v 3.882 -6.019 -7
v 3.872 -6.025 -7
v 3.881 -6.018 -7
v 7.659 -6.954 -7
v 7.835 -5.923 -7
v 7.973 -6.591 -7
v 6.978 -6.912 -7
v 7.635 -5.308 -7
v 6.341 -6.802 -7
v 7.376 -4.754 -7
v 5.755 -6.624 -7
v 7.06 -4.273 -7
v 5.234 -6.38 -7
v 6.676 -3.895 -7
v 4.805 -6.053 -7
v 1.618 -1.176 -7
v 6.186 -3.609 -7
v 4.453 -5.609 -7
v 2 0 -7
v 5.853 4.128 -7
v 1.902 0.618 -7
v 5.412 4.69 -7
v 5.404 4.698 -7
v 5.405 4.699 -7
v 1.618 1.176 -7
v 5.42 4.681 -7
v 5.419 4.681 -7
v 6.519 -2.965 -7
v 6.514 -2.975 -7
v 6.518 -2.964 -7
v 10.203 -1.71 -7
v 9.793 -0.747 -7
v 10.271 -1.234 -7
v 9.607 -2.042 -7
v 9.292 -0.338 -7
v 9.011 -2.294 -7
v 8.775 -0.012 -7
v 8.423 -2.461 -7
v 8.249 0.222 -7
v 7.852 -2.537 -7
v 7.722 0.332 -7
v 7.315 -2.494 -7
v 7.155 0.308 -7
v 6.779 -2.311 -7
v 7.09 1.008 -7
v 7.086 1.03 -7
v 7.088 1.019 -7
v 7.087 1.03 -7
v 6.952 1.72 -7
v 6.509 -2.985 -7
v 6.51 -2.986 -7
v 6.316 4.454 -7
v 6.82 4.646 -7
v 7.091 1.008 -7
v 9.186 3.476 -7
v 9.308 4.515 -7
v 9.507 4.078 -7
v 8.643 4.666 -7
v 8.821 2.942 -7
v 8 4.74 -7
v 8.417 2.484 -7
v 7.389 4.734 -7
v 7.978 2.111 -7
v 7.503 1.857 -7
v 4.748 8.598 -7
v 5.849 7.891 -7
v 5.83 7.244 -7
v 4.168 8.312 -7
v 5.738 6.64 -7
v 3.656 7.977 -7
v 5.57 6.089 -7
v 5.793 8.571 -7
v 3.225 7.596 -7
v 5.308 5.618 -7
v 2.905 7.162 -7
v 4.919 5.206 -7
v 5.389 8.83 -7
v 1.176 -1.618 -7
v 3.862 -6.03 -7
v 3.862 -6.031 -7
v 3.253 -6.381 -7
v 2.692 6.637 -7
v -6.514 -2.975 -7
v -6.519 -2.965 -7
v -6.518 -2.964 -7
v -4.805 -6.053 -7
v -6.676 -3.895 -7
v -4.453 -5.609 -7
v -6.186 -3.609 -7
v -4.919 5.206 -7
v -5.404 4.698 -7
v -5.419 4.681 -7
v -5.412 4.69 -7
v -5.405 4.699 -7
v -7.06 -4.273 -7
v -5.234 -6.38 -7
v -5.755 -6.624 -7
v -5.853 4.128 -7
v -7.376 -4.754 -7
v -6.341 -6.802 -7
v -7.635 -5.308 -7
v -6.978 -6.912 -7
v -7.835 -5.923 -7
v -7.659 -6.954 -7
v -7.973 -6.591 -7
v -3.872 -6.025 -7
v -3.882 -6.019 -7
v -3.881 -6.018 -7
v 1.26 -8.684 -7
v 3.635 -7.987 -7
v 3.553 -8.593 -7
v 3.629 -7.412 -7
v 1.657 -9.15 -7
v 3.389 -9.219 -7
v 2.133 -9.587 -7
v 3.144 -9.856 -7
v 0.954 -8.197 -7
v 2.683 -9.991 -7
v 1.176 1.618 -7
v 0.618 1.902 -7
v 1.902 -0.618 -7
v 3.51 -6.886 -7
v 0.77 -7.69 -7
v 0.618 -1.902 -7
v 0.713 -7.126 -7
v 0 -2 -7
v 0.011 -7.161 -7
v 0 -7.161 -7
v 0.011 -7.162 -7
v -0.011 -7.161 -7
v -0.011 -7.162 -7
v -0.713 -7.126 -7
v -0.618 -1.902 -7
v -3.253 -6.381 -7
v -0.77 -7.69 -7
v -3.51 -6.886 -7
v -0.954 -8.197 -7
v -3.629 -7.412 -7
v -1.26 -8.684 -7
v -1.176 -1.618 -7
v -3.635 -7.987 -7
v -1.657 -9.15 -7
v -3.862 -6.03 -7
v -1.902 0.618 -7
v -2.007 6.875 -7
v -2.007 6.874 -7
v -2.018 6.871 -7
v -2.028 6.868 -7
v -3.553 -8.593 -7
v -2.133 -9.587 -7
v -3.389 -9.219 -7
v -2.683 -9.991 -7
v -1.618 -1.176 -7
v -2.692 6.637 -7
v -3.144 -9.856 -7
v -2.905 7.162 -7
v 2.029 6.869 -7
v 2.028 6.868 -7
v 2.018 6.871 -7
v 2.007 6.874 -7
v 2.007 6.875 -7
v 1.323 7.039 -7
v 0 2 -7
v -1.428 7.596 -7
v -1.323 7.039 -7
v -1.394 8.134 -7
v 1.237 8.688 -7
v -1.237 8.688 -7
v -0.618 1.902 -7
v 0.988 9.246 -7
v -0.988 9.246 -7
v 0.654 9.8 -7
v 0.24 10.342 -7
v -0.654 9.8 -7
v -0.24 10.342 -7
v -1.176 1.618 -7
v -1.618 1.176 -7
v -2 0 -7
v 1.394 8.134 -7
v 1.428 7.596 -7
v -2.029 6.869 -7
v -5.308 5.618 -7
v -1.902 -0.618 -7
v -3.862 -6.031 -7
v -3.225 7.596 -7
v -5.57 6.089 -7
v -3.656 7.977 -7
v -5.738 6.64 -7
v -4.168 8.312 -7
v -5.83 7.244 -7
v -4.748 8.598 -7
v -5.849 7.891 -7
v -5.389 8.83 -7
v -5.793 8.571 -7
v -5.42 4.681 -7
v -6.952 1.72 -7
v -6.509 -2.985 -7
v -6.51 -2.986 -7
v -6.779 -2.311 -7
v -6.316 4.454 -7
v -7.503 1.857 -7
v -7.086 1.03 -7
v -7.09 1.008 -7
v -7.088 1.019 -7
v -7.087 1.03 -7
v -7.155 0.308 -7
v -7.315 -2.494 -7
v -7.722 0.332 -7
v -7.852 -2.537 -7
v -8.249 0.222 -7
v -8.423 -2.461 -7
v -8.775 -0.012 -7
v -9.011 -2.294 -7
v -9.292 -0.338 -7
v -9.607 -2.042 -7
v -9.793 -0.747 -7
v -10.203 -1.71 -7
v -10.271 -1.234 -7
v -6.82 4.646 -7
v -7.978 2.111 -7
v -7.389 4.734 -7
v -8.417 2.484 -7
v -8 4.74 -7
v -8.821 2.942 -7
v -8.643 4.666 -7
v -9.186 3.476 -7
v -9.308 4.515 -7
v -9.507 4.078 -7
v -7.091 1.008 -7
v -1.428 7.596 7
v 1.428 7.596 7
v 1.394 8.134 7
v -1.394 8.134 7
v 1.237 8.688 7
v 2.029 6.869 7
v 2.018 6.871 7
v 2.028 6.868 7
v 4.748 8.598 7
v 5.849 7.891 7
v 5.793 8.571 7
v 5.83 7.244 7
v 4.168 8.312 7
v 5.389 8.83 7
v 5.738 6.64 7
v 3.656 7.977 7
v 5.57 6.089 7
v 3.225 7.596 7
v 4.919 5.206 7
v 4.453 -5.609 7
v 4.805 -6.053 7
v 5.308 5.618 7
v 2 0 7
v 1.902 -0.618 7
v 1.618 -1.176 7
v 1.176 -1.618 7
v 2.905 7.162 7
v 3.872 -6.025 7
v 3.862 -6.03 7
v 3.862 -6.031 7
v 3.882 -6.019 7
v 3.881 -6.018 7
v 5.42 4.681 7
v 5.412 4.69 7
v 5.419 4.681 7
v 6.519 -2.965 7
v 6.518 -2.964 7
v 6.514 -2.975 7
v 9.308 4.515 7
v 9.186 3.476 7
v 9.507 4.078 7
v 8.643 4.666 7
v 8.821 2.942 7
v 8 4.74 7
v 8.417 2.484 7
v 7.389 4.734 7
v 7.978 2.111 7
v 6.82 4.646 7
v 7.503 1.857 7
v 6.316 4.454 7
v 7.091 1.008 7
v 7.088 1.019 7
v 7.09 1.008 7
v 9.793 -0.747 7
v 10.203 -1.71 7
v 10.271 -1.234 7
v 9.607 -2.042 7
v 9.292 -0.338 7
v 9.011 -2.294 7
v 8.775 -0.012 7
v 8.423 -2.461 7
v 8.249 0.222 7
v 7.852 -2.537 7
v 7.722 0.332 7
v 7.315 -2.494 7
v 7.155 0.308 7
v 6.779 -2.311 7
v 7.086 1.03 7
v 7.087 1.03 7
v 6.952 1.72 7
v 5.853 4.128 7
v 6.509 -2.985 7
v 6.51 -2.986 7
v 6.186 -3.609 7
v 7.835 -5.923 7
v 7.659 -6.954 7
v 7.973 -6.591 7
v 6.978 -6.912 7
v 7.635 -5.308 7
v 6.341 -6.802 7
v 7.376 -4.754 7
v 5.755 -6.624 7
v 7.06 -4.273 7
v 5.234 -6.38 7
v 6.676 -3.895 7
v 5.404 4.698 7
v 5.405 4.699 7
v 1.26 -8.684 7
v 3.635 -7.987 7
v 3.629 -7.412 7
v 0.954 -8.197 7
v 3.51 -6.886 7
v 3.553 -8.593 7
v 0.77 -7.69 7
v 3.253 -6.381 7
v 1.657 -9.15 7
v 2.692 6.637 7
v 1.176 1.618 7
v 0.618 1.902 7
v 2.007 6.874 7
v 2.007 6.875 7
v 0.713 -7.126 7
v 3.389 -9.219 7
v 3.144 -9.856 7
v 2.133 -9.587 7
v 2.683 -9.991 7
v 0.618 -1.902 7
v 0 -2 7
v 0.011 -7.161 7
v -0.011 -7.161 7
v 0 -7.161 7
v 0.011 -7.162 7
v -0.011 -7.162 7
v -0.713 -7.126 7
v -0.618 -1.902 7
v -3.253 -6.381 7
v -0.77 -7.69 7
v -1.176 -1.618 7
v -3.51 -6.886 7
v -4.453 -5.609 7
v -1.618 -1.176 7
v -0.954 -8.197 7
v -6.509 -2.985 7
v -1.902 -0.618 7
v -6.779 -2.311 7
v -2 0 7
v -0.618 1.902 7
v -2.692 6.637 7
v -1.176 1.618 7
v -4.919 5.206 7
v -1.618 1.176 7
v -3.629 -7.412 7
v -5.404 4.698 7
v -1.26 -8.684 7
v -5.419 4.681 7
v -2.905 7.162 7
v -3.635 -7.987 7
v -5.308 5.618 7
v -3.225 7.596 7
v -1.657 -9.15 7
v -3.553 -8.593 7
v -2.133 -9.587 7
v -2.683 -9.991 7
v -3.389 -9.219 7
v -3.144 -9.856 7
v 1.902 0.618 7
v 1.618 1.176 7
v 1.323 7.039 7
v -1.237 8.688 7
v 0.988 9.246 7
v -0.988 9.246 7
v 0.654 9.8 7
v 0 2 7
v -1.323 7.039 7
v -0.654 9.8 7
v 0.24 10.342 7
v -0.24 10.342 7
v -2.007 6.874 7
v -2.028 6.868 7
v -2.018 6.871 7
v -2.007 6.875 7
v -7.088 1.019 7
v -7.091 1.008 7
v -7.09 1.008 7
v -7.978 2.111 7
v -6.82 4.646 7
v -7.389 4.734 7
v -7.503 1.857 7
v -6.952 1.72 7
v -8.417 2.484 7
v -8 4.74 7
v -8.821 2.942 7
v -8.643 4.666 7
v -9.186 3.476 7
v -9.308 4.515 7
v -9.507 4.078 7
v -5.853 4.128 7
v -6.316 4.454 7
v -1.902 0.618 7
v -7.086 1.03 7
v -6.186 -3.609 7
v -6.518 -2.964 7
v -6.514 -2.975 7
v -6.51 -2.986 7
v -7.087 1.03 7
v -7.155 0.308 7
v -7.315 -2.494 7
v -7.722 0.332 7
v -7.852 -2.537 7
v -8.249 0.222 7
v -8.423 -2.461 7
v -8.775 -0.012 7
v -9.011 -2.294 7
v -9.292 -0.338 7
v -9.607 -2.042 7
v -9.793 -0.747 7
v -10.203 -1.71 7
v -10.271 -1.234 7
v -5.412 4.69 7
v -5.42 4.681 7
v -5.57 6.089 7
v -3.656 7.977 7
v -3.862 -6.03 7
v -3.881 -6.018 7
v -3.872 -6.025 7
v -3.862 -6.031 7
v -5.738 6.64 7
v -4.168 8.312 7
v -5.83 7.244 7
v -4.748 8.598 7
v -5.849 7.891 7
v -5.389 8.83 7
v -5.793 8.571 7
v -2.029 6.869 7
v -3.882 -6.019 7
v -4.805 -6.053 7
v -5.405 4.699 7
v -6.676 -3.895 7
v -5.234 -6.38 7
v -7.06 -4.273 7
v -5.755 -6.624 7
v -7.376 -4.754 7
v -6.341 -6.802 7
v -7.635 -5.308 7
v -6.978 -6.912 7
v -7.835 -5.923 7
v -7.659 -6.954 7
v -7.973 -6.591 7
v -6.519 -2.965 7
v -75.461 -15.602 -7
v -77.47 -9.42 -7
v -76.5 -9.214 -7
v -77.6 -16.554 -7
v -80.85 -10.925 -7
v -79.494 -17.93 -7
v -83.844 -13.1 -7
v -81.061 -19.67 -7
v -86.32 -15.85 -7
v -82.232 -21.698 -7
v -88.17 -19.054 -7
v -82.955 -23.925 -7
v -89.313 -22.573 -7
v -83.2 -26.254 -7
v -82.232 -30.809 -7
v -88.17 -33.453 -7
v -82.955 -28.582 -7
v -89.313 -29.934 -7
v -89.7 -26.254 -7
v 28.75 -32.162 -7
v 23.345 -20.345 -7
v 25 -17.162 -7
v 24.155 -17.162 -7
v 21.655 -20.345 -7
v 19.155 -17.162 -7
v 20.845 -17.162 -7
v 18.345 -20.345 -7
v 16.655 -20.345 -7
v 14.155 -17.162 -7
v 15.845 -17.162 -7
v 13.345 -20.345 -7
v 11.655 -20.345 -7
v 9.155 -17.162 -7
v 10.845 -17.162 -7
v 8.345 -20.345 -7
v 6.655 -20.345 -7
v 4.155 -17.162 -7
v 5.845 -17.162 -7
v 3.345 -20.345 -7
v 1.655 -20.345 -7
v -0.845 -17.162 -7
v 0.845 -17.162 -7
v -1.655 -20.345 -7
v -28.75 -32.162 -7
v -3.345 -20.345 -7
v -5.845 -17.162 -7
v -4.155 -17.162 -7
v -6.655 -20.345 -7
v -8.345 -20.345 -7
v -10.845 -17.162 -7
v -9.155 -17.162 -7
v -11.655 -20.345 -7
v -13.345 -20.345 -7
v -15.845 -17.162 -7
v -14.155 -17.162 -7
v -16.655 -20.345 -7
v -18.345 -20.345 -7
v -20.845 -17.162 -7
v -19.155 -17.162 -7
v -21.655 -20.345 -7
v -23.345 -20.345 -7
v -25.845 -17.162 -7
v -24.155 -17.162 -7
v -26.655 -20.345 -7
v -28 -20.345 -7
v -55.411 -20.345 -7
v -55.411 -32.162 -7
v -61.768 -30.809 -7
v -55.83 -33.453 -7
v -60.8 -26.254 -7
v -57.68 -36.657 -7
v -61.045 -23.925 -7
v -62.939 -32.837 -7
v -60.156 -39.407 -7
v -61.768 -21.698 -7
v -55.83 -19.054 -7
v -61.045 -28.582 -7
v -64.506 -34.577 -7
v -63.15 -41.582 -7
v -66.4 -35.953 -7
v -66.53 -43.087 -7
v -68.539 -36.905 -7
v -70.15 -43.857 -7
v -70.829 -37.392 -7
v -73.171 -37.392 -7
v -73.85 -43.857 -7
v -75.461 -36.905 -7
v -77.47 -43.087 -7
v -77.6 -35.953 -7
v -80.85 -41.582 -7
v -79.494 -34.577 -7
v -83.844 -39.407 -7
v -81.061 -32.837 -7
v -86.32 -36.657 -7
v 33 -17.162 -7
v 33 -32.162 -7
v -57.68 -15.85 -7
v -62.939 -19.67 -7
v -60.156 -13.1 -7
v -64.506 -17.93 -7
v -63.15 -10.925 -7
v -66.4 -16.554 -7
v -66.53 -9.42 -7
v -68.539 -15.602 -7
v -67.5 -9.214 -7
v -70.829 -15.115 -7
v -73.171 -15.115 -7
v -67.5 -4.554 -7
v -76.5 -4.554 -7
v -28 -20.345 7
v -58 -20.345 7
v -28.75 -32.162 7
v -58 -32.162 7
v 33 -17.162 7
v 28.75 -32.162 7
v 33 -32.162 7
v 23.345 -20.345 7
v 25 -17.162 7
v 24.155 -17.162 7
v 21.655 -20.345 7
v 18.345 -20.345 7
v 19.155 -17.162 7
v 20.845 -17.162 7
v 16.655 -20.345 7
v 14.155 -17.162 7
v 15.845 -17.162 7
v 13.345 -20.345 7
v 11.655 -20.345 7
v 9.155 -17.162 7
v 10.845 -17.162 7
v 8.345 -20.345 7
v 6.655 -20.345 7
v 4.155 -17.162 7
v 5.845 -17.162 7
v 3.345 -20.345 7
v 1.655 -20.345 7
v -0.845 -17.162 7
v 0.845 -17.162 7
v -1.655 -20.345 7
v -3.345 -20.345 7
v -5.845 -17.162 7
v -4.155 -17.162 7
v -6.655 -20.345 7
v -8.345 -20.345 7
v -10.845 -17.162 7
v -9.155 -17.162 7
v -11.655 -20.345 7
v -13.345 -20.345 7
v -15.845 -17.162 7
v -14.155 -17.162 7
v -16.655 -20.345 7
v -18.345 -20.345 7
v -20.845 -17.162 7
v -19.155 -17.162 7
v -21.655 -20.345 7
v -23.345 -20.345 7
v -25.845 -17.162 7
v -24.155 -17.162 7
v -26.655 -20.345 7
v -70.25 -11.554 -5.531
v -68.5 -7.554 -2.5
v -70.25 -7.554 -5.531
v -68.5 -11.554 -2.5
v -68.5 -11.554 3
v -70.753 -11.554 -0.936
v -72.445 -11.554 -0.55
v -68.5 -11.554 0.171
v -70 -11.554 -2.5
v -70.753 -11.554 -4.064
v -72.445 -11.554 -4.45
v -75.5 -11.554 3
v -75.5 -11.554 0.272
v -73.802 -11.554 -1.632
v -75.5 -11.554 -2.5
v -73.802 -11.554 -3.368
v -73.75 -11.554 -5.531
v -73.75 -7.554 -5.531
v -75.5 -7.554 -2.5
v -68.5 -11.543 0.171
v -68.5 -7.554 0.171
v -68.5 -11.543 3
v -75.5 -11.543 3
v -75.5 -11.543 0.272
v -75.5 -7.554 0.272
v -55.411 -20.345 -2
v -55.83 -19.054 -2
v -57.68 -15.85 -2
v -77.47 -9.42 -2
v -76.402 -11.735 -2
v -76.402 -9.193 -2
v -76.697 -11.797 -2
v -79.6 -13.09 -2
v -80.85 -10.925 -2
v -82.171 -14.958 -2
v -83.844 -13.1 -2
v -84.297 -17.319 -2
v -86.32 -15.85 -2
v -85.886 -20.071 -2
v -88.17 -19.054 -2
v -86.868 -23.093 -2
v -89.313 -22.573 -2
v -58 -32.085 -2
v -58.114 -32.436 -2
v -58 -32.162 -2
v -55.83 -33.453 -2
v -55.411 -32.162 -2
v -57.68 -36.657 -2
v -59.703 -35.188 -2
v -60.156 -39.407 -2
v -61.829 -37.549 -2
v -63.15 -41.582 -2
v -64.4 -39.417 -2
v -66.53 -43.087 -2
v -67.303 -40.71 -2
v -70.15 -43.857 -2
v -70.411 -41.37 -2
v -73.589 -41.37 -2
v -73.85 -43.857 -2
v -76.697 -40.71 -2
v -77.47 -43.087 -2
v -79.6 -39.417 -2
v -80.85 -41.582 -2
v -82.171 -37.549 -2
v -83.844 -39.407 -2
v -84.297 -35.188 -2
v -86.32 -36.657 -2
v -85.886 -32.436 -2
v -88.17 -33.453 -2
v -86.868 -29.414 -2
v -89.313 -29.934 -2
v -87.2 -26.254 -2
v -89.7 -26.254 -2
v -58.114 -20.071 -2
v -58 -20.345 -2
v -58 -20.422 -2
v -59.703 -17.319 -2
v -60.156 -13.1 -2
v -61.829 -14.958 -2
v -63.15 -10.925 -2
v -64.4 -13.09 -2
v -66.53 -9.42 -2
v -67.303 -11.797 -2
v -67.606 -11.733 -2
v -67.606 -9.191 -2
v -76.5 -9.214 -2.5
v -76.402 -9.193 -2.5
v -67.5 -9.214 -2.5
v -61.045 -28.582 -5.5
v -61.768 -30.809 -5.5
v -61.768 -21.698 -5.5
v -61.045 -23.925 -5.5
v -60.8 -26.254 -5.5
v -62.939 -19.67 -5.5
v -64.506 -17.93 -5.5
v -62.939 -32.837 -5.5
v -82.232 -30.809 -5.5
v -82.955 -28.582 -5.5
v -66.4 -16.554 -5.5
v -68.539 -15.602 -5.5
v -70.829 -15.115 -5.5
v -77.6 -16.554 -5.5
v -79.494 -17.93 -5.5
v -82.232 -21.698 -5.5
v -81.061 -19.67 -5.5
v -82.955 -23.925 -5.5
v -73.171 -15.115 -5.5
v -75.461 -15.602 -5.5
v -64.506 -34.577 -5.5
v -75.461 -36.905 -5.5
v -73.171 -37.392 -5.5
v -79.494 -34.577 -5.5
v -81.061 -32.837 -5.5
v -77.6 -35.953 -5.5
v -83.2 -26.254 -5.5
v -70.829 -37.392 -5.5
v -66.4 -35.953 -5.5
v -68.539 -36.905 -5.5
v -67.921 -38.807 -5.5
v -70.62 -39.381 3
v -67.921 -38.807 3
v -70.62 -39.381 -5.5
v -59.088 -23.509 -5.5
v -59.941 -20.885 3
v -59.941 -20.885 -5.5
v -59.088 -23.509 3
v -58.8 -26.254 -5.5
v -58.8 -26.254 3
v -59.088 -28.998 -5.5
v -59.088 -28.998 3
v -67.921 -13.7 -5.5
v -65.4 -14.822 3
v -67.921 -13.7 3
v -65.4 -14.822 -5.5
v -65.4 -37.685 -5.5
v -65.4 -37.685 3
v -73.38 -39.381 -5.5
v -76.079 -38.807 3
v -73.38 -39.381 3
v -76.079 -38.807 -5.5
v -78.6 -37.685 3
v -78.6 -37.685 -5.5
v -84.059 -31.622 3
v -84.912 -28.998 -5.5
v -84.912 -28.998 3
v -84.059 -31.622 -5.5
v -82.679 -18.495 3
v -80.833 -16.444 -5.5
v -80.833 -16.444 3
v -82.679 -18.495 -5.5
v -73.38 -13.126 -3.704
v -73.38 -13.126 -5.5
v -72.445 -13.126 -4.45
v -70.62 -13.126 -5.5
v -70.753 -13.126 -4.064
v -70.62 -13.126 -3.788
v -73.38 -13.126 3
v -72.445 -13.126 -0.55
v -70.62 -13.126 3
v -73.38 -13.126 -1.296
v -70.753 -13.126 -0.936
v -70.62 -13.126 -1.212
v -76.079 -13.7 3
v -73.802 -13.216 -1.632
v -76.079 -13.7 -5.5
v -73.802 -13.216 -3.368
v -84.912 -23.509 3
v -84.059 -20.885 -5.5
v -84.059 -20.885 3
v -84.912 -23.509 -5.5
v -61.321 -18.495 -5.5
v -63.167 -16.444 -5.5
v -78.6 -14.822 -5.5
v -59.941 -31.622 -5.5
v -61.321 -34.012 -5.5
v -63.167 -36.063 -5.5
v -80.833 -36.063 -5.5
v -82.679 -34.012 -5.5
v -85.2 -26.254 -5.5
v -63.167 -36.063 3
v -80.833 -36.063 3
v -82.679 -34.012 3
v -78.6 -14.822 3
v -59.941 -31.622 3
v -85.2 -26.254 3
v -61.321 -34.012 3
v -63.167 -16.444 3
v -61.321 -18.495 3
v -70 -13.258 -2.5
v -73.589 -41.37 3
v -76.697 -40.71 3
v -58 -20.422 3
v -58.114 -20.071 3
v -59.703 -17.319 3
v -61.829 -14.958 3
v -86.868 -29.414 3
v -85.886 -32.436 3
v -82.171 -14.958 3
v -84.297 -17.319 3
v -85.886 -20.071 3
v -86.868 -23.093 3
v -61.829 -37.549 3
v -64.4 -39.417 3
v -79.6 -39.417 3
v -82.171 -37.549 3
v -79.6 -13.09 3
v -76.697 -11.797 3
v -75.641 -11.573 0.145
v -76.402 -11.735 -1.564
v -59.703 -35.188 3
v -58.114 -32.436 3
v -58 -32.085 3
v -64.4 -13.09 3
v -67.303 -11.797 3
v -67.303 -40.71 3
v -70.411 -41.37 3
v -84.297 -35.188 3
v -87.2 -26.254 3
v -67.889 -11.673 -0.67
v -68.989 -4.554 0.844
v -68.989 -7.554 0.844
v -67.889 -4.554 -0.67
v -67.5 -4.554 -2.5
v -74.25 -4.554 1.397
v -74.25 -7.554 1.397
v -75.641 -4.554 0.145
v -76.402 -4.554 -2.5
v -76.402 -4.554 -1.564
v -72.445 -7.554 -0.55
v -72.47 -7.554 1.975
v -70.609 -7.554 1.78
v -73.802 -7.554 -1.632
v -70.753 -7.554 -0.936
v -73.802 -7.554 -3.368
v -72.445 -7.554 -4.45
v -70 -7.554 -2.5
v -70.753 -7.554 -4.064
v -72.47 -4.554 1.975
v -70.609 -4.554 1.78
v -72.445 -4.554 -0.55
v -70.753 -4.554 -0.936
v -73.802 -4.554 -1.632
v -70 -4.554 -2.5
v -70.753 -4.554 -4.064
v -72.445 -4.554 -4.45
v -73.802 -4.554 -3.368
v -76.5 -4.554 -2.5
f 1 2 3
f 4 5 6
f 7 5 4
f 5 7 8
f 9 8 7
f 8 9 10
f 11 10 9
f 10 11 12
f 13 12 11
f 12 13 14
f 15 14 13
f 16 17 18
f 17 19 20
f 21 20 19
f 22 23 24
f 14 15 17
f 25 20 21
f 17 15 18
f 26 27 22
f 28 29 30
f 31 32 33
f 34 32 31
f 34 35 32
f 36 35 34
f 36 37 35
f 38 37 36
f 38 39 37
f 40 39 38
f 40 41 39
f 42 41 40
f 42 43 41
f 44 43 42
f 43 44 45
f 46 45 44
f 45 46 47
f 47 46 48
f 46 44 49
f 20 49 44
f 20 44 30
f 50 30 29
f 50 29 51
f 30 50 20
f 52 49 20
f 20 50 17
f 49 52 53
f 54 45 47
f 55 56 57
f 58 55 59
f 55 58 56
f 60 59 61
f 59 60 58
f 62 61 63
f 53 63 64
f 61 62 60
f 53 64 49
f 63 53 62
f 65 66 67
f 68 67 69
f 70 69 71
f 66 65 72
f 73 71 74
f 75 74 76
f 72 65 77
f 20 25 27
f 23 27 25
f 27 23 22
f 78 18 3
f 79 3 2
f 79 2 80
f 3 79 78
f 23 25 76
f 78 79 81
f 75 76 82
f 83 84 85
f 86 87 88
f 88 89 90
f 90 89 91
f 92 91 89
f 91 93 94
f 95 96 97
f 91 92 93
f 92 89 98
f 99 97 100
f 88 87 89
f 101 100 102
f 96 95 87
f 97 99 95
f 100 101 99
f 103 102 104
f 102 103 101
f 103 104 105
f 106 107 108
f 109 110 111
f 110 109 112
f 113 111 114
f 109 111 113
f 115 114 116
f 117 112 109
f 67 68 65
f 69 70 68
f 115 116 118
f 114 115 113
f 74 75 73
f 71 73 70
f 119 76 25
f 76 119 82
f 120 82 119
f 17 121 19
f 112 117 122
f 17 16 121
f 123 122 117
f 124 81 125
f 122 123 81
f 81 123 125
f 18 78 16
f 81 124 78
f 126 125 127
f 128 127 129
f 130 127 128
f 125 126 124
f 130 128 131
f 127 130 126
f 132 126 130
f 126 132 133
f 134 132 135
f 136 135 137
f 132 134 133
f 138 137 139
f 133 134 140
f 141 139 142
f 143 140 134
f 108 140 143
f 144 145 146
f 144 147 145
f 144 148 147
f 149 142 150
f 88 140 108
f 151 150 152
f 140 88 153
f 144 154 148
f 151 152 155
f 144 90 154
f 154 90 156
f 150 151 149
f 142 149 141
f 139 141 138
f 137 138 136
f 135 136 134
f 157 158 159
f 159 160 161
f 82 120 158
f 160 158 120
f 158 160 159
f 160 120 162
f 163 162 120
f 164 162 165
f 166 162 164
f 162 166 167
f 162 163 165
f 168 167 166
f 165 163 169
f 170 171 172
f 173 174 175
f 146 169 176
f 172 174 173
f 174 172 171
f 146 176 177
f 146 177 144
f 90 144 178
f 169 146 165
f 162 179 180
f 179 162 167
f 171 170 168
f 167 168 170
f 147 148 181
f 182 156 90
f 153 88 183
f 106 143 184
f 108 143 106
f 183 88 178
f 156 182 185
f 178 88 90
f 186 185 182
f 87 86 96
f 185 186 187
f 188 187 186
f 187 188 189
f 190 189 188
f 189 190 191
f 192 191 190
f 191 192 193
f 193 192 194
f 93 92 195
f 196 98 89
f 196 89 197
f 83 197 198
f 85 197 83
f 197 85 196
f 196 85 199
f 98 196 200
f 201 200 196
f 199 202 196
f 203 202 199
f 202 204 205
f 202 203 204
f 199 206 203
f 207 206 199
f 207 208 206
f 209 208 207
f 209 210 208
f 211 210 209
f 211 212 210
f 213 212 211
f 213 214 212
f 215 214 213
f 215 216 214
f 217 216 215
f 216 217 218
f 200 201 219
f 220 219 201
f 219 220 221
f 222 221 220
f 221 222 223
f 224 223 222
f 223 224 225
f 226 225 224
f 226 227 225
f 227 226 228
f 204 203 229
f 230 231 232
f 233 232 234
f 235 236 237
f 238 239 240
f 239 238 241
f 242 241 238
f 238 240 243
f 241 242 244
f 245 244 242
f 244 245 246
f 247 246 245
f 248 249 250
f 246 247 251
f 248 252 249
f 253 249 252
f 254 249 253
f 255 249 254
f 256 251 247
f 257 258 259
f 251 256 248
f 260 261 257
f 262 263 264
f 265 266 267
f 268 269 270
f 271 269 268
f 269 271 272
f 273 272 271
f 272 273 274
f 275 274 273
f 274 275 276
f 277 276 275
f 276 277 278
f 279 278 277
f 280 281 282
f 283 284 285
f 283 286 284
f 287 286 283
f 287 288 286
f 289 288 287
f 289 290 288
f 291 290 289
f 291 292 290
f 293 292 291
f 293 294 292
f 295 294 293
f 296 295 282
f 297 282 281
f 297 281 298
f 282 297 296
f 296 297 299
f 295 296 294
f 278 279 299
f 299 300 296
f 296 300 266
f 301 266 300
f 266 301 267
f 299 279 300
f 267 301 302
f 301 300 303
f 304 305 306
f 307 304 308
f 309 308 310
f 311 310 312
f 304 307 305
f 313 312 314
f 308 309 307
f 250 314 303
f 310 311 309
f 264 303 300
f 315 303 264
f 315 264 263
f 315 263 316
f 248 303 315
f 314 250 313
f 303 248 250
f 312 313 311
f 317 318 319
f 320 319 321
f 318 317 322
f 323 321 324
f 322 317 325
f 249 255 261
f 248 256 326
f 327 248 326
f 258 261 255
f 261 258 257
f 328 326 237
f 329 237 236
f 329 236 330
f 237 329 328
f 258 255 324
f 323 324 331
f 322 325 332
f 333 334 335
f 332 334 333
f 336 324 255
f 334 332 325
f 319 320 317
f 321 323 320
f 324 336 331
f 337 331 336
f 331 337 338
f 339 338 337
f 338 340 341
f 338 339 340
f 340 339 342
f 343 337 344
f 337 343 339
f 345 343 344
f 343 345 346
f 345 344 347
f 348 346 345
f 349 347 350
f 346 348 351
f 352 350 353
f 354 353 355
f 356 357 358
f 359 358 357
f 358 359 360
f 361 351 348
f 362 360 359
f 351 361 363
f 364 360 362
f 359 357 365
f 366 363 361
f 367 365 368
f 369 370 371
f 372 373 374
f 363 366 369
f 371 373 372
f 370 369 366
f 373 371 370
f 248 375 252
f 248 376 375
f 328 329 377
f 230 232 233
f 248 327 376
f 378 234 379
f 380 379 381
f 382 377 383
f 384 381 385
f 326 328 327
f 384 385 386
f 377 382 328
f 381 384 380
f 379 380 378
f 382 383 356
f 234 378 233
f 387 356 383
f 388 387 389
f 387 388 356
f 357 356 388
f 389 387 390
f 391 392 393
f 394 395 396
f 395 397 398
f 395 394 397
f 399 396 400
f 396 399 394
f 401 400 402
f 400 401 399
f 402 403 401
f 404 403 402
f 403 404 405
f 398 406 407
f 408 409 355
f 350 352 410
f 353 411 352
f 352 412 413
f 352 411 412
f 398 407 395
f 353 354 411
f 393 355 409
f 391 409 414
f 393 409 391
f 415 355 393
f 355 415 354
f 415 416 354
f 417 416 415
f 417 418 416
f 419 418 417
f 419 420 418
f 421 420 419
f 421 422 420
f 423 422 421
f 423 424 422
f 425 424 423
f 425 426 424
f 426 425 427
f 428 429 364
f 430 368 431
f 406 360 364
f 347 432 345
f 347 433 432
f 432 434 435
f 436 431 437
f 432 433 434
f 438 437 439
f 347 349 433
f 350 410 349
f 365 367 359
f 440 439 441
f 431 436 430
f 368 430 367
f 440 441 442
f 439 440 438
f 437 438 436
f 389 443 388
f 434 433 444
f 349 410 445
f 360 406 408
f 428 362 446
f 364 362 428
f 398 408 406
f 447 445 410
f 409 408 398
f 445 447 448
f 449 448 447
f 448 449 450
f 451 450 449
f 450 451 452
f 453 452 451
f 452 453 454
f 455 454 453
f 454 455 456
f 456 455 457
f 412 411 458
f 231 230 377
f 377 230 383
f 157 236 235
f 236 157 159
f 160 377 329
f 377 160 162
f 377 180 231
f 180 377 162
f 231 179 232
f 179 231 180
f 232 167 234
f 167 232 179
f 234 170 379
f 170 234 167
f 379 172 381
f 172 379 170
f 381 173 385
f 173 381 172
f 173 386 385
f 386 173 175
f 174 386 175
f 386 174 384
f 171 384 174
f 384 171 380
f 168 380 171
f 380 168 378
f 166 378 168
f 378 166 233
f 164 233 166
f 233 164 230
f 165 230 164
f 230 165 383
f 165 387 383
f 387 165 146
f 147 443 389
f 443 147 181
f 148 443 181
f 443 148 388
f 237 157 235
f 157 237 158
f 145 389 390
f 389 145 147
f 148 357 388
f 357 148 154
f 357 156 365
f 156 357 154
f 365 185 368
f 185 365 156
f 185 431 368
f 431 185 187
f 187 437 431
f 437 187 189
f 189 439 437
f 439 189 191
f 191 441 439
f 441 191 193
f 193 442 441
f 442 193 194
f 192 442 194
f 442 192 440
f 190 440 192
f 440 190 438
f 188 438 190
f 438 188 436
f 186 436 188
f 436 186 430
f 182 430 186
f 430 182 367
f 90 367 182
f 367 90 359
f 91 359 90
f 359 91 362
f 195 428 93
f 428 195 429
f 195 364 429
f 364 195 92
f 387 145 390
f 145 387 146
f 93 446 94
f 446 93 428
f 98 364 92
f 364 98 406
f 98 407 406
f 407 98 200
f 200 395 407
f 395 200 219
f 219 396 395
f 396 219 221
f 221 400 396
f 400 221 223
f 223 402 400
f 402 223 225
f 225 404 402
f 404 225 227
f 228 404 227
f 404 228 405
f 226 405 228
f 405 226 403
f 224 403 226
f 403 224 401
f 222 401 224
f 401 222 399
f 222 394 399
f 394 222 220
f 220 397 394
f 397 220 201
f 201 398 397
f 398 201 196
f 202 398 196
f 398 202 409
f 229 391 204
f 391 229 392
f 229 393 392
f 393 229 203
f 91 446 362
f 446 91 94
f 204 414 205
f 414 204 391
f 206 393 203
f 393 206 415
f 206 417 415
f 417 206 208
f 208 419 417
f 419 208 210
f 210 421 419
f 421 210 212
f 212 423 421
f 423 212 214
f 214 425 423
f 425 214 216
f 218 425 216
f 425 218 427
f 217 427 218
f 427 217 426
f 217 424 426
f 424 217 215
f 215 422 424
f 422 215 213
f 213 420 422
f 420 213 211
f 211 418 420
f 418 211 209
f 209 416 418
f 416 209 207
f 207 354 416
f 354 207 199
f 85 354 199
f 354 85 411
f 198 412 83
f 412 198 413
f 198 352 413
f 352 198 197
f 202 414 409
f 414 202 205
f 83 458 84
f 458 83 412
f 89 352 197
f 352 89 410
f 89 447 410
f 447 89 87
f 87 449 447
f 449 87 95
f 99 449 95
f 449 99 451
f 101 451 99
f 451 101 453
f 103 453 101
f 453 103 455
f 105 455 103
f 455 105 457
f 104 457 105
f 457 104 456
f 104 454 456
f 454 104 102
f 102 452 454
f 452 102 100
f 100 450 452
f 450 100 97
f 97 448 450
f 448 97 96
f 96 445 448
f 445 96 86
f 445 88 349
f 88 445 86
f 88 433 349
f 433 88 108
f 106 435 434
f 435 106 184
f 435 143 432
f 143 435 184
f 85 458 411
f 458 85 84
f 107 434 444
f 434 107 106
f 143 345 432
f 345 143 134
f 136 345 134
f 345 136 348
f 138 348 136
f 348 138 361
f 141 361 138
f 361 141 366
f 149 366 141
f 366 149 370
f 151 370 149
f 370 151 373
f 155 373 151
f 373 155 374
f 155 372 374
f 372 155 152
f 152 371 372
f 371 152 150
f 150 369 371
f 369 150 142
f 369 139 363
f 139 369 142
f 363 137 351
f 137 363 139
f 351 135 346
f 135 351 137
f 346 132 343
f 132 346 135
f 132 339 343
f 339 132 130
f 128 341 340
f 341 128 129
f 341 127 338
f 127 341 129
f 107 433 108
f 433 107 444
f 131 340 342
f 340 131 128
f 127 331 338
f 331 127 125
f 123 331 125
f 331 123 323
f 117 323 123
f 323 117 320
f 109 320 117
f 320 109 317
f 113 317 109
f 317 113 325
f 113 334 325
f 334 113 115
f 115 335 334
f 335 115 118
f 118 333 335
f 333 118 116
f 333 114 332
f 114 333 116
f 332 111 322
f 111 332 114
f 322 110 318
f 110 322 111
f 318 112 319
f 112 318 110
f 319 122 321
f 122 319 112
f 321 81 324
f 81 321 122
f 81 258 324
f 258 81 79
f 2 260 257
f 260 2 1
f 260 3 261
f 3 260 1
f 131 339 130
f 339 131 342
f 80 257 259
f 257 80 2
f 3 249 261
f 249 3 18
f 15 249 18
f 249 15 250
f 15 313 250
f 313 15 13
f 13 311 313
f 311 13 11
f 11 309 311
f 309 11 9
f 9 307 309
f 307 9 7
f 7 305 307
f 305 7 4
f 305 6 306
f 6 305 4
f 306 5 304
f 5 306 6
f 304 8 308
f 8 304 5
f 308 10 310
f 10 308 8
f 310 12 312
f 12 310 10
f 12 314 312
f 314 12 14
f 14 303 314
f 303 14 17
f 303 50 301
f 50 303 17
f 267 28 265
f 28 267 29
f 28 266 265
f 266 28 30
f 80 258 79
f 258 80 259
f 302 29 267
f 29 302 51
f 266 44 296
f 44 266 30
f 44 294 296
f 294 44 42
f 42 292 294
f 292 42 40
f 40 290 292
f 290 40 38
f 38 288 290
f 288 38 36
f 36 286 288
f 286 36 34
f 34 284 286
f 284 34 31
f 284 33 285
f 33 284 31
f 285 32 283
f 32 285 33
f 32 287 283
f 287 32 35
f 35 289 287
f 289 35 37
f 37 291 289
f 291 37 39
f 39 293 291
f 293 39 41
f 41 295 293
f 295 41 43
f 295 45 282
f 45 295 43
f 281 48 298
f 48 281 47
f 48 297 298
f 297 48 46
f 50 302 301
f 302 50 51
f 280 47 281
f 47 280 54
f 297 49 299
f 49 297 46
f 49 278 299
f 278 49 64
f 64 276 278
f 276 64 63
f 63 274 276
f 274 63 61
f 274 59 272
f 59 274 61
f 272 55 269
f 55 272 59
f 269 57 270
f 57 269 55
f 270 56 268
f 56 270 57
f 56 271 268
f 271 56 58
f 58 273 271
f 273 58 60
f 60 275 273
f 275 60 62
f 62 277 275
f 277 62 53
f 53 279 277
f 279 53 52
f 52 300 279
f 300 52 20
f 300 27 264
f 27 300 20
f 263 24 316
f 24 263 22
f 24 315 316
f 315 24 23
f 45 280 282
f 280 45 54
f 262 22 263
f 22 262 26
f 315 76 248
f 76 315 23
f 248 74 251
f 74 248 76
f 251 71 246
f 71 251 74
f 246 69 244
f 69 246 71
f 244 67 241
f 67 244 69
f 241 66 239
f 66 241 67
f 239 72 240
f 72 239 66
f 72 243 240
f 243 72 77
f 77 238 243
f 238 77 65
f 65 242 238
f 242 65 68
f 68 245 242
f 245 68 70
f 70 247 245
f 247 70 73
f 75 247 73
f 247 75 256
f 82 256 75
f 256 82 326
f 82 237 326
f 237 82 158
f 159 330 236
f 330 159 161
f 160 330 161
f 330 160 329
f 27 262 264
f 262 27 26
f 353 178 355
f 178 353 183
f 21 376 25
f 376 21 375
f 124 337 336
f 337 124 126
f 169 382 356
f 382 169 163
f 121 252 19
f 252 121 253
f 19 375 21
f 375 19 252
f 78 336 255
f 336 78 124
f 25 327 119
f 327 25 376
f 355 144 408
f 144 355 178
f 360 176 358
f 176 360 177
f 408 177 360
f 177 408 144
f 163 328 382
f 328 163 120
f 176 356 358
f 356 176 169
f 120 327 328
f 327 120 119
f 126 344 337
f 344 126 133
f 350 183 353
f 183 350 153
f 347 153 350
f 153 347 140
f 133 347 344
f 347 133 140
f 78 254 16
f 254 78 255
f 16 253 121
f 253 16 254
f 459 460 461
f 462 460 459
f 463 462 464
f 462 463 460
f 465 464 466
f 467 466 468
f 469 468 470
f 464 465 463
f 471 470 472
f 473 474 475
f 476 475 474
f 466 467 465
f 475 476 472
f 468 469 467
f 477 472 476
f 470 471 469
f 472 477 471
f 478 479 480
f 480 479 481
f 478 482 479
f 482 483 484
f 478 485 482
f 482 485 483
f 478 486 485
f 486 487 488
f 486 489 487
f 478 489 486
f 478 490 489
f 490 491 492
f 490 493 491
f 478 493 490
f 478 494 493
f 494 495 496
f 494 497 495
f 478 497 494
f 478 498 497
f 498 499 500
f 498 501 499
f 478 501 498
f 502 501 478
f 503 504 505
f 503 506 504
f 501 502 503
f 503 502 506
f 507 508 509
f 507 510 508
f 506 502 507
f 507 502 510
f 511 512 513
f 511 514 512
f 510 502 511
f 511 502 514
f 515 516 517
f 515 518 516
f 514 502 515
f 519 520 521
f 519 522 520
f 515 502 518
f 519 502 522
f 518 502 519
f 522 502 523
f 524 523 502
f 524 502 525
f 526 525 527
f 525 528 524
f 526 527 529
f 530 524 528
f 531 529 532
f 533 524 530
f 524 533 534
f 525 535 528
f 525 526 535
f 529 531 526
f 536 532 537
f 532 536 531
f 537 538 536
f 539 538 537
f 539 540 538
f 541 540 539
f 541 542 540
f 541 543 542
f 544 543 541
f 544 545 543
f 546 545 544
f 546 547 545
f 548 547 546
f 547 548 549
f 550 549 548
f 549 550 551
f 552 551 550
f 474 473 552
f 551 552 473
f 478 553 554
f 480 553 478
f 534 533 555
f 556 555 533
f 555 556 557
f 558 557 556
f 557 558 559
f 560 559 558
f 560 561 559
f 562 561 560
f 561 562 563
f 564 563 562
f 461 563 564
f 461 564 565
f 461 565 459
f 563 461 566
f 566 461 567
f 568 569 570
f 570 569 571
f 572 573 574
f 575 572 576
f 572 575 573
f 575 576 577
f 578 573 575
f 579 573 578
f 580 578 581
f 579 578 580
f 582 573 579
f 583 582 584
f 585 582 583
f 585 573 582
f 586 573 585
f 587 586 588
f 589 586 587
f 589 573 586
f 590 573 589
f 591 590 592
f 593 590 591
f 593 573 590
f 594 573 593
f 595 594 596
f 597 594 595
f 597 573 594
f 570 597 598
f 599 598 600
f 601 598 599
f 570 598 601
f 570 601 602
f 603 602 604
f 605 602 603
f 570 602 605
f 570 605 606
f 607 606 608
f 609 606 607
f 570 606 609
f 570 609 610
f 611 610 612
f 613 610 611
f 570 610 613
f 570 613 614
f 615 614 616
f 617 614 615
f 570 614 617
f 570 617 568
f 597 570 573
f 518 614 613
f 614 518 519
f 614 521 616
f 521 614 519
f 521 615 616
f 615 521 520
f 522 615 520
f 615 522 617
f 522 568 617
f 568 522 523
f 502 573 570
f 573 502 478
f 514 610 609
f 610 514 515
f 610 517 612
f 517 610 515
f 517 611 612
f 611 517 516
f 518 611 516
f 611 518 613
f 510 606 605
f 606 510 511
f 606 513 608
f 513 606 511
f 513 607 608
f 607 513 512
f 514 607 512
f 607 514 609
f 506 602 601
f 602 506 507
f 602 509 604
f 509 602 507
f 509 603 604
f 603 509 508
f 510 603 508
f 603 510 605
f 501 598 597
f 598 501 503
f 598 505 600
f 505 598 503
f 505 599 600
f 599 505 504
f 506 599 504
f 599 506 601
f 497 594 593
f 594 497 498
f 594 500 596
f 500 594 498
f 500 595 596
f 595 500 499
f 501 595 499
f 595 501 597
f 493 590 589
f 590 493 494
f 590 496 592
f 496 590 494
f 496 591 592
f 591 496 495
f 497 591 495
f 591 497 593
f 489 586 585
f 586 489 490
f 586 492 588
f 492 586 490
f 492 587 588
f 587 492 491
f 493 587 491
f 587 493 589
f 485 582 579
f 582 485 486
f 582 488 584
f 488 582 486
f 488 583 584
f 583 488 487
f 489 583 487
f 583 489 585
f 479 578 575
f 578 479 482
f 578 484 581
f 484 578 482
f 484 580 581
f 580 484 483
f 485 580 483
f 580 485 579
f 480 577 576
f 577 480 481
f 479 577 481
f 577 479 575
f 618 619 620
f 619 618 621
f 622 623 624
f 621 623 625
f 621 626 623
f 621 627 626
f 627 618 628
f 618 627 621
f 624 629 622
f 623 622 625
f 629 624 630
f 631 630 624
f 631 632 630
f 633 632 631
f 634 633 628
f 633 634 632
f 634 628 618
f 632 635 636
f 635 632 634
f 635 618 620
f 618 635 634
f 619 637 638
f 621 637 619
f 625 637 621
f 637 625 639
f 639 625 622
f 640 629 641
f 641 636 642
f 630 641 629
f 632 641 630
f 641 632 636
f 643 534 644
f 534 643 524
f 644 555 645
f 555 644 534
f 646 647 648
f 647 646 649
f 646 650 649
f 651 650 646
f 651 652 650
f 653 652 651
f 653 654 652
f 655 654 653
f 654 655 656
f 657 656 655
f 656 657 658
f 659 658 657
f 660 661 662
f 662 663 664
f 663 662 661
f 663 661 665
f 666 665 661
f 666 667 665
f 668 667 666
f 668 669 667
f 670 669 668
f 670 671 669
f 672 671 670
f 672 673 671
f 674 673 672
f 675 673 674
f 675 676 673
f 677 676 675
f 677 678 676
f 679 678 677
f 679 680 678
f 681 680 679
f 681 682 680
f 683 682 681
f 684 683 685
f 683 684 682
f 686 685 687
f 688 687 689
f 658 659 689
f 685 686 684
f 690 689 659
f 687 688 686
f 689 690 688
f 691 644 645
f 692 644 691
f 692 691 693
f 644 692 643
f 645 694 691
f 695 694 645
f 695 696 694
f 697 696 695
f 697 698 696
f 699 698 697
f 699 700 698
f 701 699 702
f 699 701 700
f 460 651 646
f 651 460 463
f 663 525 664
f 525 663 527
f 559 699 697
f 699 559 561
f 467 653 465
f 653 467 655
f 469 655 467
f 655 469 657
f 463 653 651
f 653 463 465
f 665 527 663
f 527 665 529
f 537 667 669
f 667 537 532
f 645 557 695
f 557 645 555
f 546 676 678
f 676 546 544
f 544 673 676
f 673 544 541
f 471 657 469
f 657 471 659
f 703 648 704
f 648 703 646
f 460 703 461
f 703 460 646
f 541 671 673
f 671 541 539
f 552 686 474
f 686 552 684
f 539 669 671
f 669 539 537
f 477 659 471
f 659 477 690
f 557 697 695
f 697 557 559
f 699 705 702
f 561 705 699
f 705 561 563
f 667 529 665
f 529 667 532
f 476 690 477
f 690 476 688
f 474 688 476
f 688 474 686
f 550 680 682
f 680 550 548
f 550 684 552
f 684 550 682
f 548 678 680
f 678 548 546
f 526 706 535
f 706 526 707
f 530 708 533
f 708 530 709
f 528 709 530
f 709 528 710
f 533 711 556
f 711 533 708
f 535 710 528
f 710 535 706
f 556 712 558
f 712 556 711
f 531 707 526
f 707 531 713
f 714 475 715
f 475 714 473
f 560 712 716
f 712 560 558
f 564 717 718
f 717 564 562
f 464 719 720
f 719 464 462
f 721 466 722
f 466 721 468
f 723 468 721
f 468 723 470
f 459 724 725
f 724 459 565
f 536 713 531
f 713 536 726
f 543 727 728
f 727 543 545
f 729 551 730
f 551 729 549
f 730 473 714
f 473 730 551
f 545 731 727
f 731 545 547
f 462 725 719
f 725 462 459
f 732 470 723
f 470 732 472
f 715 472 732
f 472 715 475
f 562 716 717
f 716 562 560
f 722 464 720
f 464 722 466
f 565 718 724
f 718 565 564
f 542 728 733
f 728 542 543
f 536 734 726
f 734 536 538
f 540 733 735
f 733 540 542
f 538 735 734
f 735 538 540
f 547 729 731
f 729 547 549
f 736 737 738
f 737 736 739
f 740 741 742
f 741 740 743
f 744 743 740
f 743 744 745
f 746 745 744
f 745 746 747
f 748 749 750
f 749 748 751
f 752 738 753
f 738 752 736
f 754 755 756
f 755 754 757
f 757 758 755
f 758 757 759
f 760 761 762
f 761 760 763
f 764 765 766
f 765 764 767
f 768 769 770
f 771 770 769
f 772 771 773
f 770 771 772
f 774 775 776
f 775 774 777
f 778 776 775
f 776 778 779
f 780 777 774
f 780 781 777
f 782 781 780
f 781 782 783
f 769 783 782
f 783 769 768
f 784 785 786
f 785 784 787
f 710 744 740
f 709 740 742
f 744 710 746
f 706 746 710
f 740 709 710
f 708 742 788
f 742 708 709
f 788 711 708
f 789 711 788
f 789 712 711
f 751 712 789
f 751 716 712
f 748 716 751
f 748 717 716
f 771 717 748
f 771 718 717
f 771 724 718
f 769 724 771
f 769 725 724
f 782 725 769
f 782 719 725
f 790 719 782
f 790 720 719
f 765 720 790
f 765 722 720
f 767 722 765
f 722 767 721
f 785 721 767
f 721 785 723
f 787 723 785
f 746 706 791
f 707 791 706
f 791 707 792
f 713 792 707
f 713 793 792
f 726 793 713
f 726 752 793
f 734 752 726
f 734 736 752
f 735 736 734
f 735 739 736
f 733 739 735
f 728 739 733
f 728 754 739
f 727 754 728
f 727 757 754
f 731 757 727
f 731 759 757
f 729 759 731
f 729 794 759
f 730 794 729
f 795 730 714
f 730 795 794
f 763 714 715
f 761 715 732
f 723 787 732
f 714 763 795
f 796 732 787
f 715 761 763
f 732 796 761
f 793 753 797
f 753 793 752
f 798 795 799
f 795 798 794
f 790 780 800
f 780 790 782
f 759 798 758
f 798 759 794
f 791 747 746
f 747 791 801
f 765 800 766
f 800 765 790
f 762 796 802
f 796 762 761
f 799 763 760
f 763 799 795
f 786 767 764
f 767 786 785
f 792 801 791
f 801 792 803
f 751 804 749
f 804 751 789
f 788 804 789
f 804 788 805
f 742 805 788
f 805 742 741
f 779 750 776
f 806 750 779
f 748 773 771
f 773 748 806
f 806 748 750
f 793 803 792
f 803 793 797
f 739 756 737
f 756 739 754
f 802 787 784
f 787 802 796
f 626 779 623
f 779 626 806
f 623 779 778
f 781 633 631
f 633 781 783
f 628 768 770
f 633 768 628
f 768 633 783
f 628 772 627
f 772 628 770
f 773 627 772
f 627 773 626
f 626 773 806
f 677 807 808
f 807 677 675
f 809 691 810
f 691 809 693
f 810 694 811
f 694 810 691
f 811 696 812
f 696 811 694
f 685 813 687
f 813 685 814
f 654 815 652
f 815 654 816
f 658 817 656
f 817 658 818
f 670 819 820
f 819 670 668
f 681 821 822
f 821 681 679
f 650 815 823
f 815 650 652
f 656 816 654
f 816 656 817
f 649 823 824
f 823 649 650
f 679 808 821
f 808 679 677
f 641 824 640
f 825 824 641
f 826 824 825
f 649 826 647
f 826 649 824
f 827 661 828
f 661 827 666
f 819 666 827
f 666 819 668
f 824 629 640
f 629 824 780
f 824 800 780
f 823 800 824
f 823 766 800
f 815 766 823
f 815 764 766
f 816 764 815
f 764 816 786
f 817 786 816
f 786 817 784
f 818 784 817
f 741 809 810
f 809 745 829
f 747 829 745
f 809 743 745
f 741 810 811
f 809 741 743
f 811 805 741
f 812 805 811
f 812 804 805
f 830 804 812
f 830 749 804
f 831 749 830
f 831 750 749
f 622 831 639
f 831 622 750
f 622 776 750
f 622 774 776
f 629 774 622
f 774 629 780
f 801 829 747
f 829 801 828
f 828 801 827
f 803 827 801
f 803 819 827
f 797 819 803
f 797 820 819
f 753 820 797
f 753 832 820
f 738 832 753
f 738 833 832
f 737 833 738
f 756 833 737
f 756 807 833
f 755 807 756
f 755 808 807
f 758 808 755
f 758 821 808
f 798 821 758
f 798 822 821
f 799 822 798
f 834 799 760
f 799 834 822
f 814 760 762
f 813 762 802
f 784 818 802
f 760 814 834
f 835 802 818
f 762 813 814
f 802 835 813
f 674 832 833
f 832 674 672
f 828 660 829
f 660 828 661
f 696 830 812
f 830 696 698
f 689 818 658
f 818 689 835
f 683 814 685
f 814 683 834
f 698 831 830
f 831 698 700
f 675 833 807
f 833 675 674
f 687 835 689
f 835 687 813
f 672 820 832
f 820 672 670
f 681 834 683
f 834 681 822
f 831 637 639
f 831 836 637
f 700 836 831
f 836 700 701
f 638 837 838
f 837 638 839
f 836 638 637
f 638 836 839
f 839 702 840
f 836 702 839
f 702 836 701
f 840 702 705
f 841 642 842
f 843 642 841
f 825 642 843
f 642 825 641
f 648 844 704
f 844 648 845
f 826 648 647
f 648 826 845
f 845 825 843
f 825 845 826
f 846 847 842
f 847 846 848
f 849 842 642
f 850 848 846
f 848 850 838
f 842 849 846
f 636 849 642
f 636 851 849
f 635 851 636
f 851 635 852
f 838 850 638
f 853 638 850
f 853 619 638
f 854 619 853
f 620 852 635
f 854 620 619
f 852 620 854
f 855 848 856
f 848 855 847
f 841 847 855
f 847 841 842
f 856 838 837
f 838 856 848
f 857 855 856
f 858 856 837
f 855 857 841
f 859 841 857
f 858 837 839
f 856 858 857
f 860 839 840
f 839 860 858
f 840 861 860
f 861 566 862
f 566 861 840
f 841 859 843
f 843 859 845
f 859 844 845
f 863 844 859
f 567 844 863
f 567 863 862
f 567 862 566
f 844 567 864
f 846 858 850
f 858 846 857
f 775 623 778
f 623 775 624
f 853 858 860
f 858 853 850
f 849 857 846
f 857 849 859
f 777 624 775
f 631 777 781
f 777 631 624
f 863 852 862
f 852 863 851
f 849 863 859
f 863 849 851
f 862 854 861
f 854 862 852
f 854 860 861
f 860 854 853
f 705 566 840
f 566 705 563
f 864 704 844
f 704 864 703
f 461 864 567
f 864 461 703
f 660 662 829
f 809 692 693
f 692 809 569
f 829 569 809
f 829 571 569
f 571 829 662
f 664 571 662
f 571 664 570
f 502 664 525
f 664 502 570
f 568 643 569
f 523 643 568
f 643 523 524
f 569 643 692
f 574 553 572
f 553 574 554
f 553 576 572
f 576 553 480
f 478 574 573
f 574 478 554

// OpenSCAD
//////////////////////////////////////////////////////////////////////////////////////////////
// Public Domain Parametric Involute Spur Gear (and involute helical gear and involute rack)
// version 1.1
// by Leemon Baird, 2011, Leemon@Leemon.com
//http://www.thingiverse.com/thing:5505
//
// This file is public domain.  Use it for any purpose, including commercial
// applications.  Attribution would be nice, but is not required.  There is
// no warranty of any kind, including its correctness, usefulness, or safety.
// 
// This is parameterized involute spur (or helical) gear.  It is much simpler and less powerful than
// others on Thingiverse.  But it is public domain.  I implemented it from scratch from the 
// descriptions and equations on Wikipedia and the web, using Mathematica for calculations and testing,
// and I now release it into the public domain.
//
//		http://en.wikipedia.org/wiki/Involute_gear
//		http://en.wikipedia.org/wiki/Gear
//		http://en.wikipedia.org/wiki/List_of_gear_nomenclature
//		http://gtrebaol.free.fr/doc/catia/spur_gear.html
//		http://www.cs.cmu.edu/~rapidproto/mechanisms/chpt7.html
//
// The module gear() gives an involute spur gear, with reasonable defaults for all the parameters.
// Normally, you should just choose the first 4 parameters, and let the rest be default values.
// The module gear() gives a gear in the XY plane, centered on the origin, with one tooth centered on
// the positive Y axis.  The various functions below it take the same parameters, and return various
// measurements for the gear.  The most important is pitch_radius, which tells how far apart to space
// gears that are meshing, and adendum_radius, which gives the size of the region filled by the gear.
// A gear has a "pitch circle", which is an invisible circle that cuts through the middle of each
// tooth (though not the exact center). In order for two gears to mesh, their pitch circles should 
// just touch.  So the distance between their centers should be pitch_radius() for one, plus pitch_radius() 
// for the other, which gives the radii of their pitch circles.
//
// In order for two gears to mesh, they must have the same mm_per_tooth and pressure_angle parameters.  
// mm_per_tooth gives the number of millimeters of arc around the pitch circle covered by one tooth and one
// space between teeth.  The pitch angle controls how flat or bulged the sides of the teeth are.  Common
// values include 14.5 degrees and 20 degrees, and occasionally 25.  Though I've seen 28 recommended for
// plastic gears. Larger numbers bulge out more, giving stronger teeth, so 28 degrees is the default here.
//
// The ratio of number_of_teeth for two meshing gears gives how many times one will make a full 
// revolution when the the other makes one full revolution.  If the two numbers are coprime (i.e. 
// are not both divisible by the same number greater than 1), then every tooth on one gear
// will meet every tooth on the other, for more even wear.  So coprime numbers of teeth are good.
//
// The module rack() gives a rack, which is a bar with teeth.  A rack can mesh with any
// gear that has the same mm_per_tooth and pressure_angle.
//
// Some terminology: 
// The outline of a gear is a smooth circle (the "pitch circle") which has mountains and valleys
// added so it is toothed.  So there is an inner circle (the "root circle") that touches the 
// base of all the teeth, an outer circle that touches the tips of all the teeth,
// and the invisible pitch circle in between them.  There is also a "base circle", which can be smaller than
// all three of the others, which controls the shape of the teeth.  The side of each tooth lies on the path 
// that the end of a string would follow if it were wrapped tightly around the base circle, then slowly unwound.  
// That shape is an "involute", which gives this type of gear its name.
//
//////////////////////////////////////////////////////////////////////////////////////////////

//An involute spur gear, with reasonable defaults for all the parameters.
//Normally, you should just choose the first 4 parameters, and let the rest be default values.
//Meshing gears must match in mm_per_tooth, pressure_angle, and twist,
//and be separated by the sum of their pitch radii, which can be found with pitch_radius().
module gear (
	mm_per_tooth    = 3,    //this is the "circular pitch", the circumference of the pitch circle divided by the number of teeth
	number_of_teeth = 11,   //total number of teeth around the entire perimeter
	thickness       = 6,    //thickness of gear in mm
	hole_diameter   = 3,    //diameter of the hole in the center, in mm
	twist           = 0,    //teeth rotate this many degrees from bottom of gear to top.  360 makes the gear a screw with each thread going around once
	teeth_to_hide   = 0,    //number of teeth to delete to make this only a fraction of a circle
	pressure_angle  = 28,   //Controls how straight or bulged the tooth sides are. In degrees.
	clearance       = 0.0,  //gap between top of a tooth on one gear and bottom of valley on a meshing gear (in millimeters)
	backlash        = 0.0   //gap between two meshing teeth, in the direction along the circumference of the pitch circle
) {
	assign(pi = 3.1415926)
	assign(p  = mm_per_tooth * number_of_teeth / pi / 2)  //radius of pitch circle
	assign(c  = p + mm_per_tooth / pi - clearance)        //radius of outer circle
	assign(b  = p*cos(pressure_angle))                    //radius of base circle
	assign(r  = p-(c-p)-clearance)                        //radius of root circle
	assign(t  = mm_per_tooth/2-backlash/2)                //tooth thickness at pitch circle
	assign(k  = -iang(b, p) - t/2/p/pi*180) {             //angle to where involute meets base circle on each side of tooth
		difference() {
			for (i = [0:number_of_teeth-teeth_to_hide-1] )
				rotate([0,0,i*360/number_of_teeth])
					linear_extrude(height = thickness, center = true, convexity = 10, twist = twist)
						polygon(
							points=[
								[0, -hole_diameter/10],
								polar(r, -181/number_of_teeth),
								polar(r, r<b ? k : -180/number_of_teeth),
								q7(0/5,r,b,c,k, 1),q7(1/5,r,b,c,k, 1),q7(2/5,r,b,c,k, 1),q7(3/5,r,b,c,k, 1),q7(4/5,r,b,c,k, 1),q7(5/5,r,b,c,k, 1),
								q7(5/5,r,b,c,k,-1),q7(4/5,r,b,c,k,-1),q7(3/5,r,b,c,k,-1),q7(2/5,r,b,c,k,-1),q7(1/5,r,b,c,k,-1),q7(0/5,r,b,c,k,-1),
								polar(r, r<b ? -k : 180/number_of_teeth),
								polar(r, 181/number_of_teeth)
							],
 							paths=[[0,1,2,3,4,5,6,7,8,9,10,11,12,13,14,15,16]]
						);
			cylinder(h=2*thickness+1, r=hole_diameter/2, center=true, $fn=20);
		}
	}
};	
//these 4 functions are used by gear
function polar(r,theta)   = r*[sin(theta), cos(theta)];                            //convert polar to cartesian coordinates
function iang(r1,r2)      = sqrt((r2/r1)*(r2/r1) - 1)/3.1415926*180 - acos(r1/r2); //unwind a string this many degrees to go from radius r1 to radius r2
function q7(f,r,b,r2,t,s) = q6(b,s,t,(1-f)*max(b,r)+f*r2);                         //radius a fraction f up the curved side of the tooth 
function q6(b,s,t,d)      = polar(d,s*(iang(b,d)+t));                              //point at radius d on the involute curve

//a rack, which is a straight line with teeth (the same as a segment from a giant gear with a huge number of teeth).
//The "pitch circle" is a line along the X axis.
module rack (
	mm_per_tooth    = 3,    //this is the "circular pitch", the circumference of the pitch circle divided by the number of teeth
	number_of_teeth = 11,   //total number of teeth along the rack
	thickness       = 6,    //thickness of rack in mm (affects each tooth)
	height          = 120,   //height of rack in mm, from tooth top to far side of rack.
	pressure_angle  = 28,   //Controls how straight or bulged the tooth sides are. In degrees.
	backlash        = 0.0   //gap between two meshing teeth, in the direction along the circumference of the pitch circle
) {
	assign(pi = 3.1415926)
	assign(a = mm_per_tooth / pi) //addendum
	assign(t = a*cos(pressure_angle)-1)         //tooth side is tilted so top/bottom corners move this amount
		for (i = [0:number_of_teeth-1] )
			translate([i*mm_per_tooth,0,0])
				linear_extrude(height = thickness, center = true, convexity = 10)
					polygon(
						points=[
							[-mm_per_tooth * 3/4,                 a-height],
							[-mm_per_tooth * 3/4 - backlash,     -a],
							[-mm_per_tooth * 1/4 + backlash - t, -a],
							[-mm_per_tooth * 1/4 + backlash + t,  a],
							[ mm_per_tooth * 1/4 - backlash - t,  a],
							[ mm_per_tooth * 1/4 - backlash + t, -a],
							[ mm_per_tooth * 3/4 + backlash,     -a],
							[ mm_per_tooth * 3/4,                 a-height],
						],
						paths=[[0,1,2,3,4,5,6,7]]
					);
};	

//These 5 functions let the user find the derived dimensions of the gear.
//A gear fits within a circle of radius outer_radius, and two gears should have
//their centers separated by the sum of their pictch_radius.
function circular_pitch  (mm_per_tooth=3) = mm_per_tooth;                     //tooth density expressed as "circular pitch" in millimeters
function diametral_pitch (mm_per_tooth=3) = 3.1415926 / mm_per_tooth;         //tooth density expressed as "diametral pitch" in teeth per millimeter
function module_value    (mm_per_tooth=3) = mm_per_tooth / pi;                //tooth density expressed as "module" or "modulus" in millimeters
function pitch_radius    (mm_per_tooth=3,number_of_teeth=11) = mm_per_tooth * number_of_teeth / 3.1415926 / 2;
function outer_radius    (mm_per_tooth=3,number_of_teeth=11,clearance=0.1)    //The gear fits entirely within a cylinder of this radius.
	= mm_per_tooth*(1+number_of_teeth/2)/3.1415926  - clearance;              

//////////////////////////////////////////////////////////////////////////////////////////////
//example gear train.  
//Try it with OpenSCAD View/Animate command with 20 steps and 24 FPS.
//The gears will continue to be rotated to mesh correctly if you change the number of teeth.

n1 = 11; //red gear number of teeth
n2 = 20; //green gear
n3 = 5;  //blue gear
n4 = 20; //orange gear
n5 = 11;  //gray rack
mm_per_tooth = 5; //all meshing gears need the same mm_per_tooth (and the same pressure_angle)
thickness    = 14;
hole         = 4;
height       = 15;

d1 =pitch_radius(mm_per_tooth,n1);
d12=pitch_radius(mm_per_tooth,n1) + pitch_radius(mm_per_tooth,n2);
d13=pitch_radius(mm_per_tooth,n1) + pitch_radius(mm_per_tooth,n3);
d14=pitch_radius(mm_per_tooth,n1) + pitch_radius(mm_per_tooth,n4);

translate([0,0,0]) rotate([0,0, $t*360/n1])color([1.00,0.75,0.75])
gear(mm_per_tooth,n1,thickness,hole);

translate([(-floor(n5/2)-floor(n1/2)+$t+n1/2-1/2)*9+20, -d1-10.0, 0]) rotate([0,0,0]) color([0.75,0.75,0.75]){
union(){
rack(mm_per_tooth,n5,thickness,height);

translate([-3,-13.408005,-7]) rotate([0,270,0])
cube([14,11.8165,30]);

translate([-47,-7.5,-7])lens_holder();

translate([58,-13.408005,-7]) rotate([0,270,0])
cube([14,15,8]);

}
}


x=25.4; //Diameter of the Lens
y=10;   //Lens holder Thickness
z=3;     //Lens Holder Lip Size
X=25; //Base Diameter
Y=25;  //Base Height
a=3; //Set Screw Diameter
b=6; //Set Screw Nut Daimeter
c=3; //Set Screw Nut Thickness
d=8; //Guide Rod Diameter
e=20; //Guide Rod Length
f=3;    // Thumb Screw Head Height
g=6;   //Thumb Screw Head Diameter
i=3;    //Thumb Screw Diameter
j=3;    //PL Board Hole Diameter


module thumbscrew(){
difference(){
cylinder(f+2,(g+6)/2, (g+6)/2);
translate([0,0,2])cylinder(5,(g+1)/2, (g+1)/2);
cylinder(5,(i+1)/2, (i+1)/2);
}
difference(){
	for ( i = [0 :8] ){
					rotate( i * 360 / 8, [0, 0, 1])
					translate([(g+6)/2,0,0])
					cylinder(5,3,3);
		}	
translate([0,0,2])cylinder(5,(g+1)/2, (g+1)/2);
}
}

module mount(){
difference(){
cylinder((2/5)*Y,X/2,X/2);
translate([0,0,(1/5)*Y])cylinder(Y,(d+1)/2,(d+1)/2);
}
difference(){
translate([0,0,(2/5)*Y])cylinder((2/5)*Y,X/2,(d+6)/2);
cylinder(Y,(d+1)/2,(d+1)/2);

}
difference(){
translate([0,0,(4/5)*Y])cylinder((1/5)*Y,(d+6)/2,(d+6)/2);
cylinder(Y,(d+1)/2,(d+1)/2);

}
difference(){
translate([0,(X/2)+3,0])cylinder(5,(j+6)/2, (j+6)/2);
translate([0,(X/2)+3,0])cylinder(5,(j+1)/2, (j+1)/2);
}
difference(){
translate([0,(X/2)-2,5/2])cube([j+6,j+6,5],center = true);
translate([0,(X/2)+3,0])cylinder(5,(j+1)/2, (j+1)/2);
}
}

module lens_holder(){
difference(){
cylinder(y/2,(x+10)/2,(x+10)/2);
cylinder((y+2)/2,(x-3)/2,(x-3)/2);
translate([0,0,1.5])cylinder((y+2)/2,(x+1)/2,(x+1)/2);
translate([0,(x+10)/2+5,(b+3)/2])rotate([90,0,0])cylinder(10,(a+1)/2,(a+1)/2);
translate([0,(x+8)/2,(b+3)/2])nuttrap();
//translate([(x+15)/2,e/2,(d+6)/2])%rotate([90,0,0])cylinder(e,(d+6)/2, (d+6)/2);
}
difference(){
translate([0,0,y/2])cylinder((y)/2,(x+5)/2,(x+5)/2);
cylinder((y)*2,(x+1)/2,(x+1)/2);
translate([0,(x+10)/2+5,(b+3)/2])rotate([90,0,0])cylinder(25,(b+3)/2,(b+3)/2);
translate([0,(x+8)/2,(b+3)/2])nuttrap();
}
difference(){
translate([0,(x+8)/2,0])set_screw((b+3)/2);
cylinder((y+2),(x+1)/2,(x+1)/2);
}
//difference(){
//translate([(x+15)/2,0,0])guide_rod();
//rotate([0,0,90]){
//#translate([0,((x+7)/-2)-((d)),(d+6)/2])rotate([90,0,0])cylinder(50,(a+1)/2,(a+1)/2);
//translate([((x+7.5)/2)+((d+6)),0,0])rotate([0,0,90])set_screw1((d+6)/2);
//}
//}
//translate([((x+7.5)/2)+((d+6)),0,0])rotate([0,0,90])set_screw((d+6)/2);
}

module guide_rod(){
difference(){
translate([0,e/2,(d+6)/2])rotate([90,0,0])cylinder(e,(d+6)/2, (d+6)/2);
translate([0,(e/2)+1,(d+6)/2])rotate([90,0,0])cylinder(e+2,(d+1)/2, (d+1)/2);
}
difference(){
translate([0,0,(d+6)/4])cube([(d+6),e,(d+6)/2], center = true);
translate([0,(e/2)+1,(d+6)/2])rotate([90,0,0])cylinder(e+2,(d+1)/2, (d+1)/2);
}
}

module set_screw(h){
difference(){
translate([0,5,h])rotate([90,0,0])cylinder(10,(b+3)/2, (b+3)/2);
translate([0,10,h])rotate([90,0,0])cylinder(200,(a+1)/2, (a+1)/2);
translate([0,0,h])nuttrap();
}
difference(){
translate([0,0,h/2])cube([(b+3),10,h], center = true);
translate([0,6,h])rotate([90,0,0])cylinder(12,(a+1)/2, (a+1)/2);
translate([0,0,h])nuttrap();
}
}
module set_screw1(h){
translate([0,5,h])rotate([90,0,0])cylinder(10,(b+3)/2, (b+3)/2);
translate([0,0,h/2])cube([(b+3),10,h], center = true);

}



module nuttrap(){
translate([0,(c+1)/2,0])rotate([90,0,0])hexagon(c+1,(b+1)/2);
translate([0,0,(b*3)/2])cube([b+1,c+1,b*3],center = true);
}

module reg_polygon(sides,radius)
{
  function dia(r) = sqrt(pow(r*2,2)/2);  //sqrt((r*2^2)/2) if only we had an exponention op
  if(sides<2) square([radius,0]);
  if(sides==3) triangle(radius);
  if(sides==4) square([dia(radius),dia(radius)],center=true);
  if(sides>4) circle(r=radius,$fn=sides);
}

module hexagonf(radius)
{
  reg_polygon(6,radius);
}

module hexagon(height,radius) 
{
  linear_extrude(height=height) hexagonf(radius);
}
